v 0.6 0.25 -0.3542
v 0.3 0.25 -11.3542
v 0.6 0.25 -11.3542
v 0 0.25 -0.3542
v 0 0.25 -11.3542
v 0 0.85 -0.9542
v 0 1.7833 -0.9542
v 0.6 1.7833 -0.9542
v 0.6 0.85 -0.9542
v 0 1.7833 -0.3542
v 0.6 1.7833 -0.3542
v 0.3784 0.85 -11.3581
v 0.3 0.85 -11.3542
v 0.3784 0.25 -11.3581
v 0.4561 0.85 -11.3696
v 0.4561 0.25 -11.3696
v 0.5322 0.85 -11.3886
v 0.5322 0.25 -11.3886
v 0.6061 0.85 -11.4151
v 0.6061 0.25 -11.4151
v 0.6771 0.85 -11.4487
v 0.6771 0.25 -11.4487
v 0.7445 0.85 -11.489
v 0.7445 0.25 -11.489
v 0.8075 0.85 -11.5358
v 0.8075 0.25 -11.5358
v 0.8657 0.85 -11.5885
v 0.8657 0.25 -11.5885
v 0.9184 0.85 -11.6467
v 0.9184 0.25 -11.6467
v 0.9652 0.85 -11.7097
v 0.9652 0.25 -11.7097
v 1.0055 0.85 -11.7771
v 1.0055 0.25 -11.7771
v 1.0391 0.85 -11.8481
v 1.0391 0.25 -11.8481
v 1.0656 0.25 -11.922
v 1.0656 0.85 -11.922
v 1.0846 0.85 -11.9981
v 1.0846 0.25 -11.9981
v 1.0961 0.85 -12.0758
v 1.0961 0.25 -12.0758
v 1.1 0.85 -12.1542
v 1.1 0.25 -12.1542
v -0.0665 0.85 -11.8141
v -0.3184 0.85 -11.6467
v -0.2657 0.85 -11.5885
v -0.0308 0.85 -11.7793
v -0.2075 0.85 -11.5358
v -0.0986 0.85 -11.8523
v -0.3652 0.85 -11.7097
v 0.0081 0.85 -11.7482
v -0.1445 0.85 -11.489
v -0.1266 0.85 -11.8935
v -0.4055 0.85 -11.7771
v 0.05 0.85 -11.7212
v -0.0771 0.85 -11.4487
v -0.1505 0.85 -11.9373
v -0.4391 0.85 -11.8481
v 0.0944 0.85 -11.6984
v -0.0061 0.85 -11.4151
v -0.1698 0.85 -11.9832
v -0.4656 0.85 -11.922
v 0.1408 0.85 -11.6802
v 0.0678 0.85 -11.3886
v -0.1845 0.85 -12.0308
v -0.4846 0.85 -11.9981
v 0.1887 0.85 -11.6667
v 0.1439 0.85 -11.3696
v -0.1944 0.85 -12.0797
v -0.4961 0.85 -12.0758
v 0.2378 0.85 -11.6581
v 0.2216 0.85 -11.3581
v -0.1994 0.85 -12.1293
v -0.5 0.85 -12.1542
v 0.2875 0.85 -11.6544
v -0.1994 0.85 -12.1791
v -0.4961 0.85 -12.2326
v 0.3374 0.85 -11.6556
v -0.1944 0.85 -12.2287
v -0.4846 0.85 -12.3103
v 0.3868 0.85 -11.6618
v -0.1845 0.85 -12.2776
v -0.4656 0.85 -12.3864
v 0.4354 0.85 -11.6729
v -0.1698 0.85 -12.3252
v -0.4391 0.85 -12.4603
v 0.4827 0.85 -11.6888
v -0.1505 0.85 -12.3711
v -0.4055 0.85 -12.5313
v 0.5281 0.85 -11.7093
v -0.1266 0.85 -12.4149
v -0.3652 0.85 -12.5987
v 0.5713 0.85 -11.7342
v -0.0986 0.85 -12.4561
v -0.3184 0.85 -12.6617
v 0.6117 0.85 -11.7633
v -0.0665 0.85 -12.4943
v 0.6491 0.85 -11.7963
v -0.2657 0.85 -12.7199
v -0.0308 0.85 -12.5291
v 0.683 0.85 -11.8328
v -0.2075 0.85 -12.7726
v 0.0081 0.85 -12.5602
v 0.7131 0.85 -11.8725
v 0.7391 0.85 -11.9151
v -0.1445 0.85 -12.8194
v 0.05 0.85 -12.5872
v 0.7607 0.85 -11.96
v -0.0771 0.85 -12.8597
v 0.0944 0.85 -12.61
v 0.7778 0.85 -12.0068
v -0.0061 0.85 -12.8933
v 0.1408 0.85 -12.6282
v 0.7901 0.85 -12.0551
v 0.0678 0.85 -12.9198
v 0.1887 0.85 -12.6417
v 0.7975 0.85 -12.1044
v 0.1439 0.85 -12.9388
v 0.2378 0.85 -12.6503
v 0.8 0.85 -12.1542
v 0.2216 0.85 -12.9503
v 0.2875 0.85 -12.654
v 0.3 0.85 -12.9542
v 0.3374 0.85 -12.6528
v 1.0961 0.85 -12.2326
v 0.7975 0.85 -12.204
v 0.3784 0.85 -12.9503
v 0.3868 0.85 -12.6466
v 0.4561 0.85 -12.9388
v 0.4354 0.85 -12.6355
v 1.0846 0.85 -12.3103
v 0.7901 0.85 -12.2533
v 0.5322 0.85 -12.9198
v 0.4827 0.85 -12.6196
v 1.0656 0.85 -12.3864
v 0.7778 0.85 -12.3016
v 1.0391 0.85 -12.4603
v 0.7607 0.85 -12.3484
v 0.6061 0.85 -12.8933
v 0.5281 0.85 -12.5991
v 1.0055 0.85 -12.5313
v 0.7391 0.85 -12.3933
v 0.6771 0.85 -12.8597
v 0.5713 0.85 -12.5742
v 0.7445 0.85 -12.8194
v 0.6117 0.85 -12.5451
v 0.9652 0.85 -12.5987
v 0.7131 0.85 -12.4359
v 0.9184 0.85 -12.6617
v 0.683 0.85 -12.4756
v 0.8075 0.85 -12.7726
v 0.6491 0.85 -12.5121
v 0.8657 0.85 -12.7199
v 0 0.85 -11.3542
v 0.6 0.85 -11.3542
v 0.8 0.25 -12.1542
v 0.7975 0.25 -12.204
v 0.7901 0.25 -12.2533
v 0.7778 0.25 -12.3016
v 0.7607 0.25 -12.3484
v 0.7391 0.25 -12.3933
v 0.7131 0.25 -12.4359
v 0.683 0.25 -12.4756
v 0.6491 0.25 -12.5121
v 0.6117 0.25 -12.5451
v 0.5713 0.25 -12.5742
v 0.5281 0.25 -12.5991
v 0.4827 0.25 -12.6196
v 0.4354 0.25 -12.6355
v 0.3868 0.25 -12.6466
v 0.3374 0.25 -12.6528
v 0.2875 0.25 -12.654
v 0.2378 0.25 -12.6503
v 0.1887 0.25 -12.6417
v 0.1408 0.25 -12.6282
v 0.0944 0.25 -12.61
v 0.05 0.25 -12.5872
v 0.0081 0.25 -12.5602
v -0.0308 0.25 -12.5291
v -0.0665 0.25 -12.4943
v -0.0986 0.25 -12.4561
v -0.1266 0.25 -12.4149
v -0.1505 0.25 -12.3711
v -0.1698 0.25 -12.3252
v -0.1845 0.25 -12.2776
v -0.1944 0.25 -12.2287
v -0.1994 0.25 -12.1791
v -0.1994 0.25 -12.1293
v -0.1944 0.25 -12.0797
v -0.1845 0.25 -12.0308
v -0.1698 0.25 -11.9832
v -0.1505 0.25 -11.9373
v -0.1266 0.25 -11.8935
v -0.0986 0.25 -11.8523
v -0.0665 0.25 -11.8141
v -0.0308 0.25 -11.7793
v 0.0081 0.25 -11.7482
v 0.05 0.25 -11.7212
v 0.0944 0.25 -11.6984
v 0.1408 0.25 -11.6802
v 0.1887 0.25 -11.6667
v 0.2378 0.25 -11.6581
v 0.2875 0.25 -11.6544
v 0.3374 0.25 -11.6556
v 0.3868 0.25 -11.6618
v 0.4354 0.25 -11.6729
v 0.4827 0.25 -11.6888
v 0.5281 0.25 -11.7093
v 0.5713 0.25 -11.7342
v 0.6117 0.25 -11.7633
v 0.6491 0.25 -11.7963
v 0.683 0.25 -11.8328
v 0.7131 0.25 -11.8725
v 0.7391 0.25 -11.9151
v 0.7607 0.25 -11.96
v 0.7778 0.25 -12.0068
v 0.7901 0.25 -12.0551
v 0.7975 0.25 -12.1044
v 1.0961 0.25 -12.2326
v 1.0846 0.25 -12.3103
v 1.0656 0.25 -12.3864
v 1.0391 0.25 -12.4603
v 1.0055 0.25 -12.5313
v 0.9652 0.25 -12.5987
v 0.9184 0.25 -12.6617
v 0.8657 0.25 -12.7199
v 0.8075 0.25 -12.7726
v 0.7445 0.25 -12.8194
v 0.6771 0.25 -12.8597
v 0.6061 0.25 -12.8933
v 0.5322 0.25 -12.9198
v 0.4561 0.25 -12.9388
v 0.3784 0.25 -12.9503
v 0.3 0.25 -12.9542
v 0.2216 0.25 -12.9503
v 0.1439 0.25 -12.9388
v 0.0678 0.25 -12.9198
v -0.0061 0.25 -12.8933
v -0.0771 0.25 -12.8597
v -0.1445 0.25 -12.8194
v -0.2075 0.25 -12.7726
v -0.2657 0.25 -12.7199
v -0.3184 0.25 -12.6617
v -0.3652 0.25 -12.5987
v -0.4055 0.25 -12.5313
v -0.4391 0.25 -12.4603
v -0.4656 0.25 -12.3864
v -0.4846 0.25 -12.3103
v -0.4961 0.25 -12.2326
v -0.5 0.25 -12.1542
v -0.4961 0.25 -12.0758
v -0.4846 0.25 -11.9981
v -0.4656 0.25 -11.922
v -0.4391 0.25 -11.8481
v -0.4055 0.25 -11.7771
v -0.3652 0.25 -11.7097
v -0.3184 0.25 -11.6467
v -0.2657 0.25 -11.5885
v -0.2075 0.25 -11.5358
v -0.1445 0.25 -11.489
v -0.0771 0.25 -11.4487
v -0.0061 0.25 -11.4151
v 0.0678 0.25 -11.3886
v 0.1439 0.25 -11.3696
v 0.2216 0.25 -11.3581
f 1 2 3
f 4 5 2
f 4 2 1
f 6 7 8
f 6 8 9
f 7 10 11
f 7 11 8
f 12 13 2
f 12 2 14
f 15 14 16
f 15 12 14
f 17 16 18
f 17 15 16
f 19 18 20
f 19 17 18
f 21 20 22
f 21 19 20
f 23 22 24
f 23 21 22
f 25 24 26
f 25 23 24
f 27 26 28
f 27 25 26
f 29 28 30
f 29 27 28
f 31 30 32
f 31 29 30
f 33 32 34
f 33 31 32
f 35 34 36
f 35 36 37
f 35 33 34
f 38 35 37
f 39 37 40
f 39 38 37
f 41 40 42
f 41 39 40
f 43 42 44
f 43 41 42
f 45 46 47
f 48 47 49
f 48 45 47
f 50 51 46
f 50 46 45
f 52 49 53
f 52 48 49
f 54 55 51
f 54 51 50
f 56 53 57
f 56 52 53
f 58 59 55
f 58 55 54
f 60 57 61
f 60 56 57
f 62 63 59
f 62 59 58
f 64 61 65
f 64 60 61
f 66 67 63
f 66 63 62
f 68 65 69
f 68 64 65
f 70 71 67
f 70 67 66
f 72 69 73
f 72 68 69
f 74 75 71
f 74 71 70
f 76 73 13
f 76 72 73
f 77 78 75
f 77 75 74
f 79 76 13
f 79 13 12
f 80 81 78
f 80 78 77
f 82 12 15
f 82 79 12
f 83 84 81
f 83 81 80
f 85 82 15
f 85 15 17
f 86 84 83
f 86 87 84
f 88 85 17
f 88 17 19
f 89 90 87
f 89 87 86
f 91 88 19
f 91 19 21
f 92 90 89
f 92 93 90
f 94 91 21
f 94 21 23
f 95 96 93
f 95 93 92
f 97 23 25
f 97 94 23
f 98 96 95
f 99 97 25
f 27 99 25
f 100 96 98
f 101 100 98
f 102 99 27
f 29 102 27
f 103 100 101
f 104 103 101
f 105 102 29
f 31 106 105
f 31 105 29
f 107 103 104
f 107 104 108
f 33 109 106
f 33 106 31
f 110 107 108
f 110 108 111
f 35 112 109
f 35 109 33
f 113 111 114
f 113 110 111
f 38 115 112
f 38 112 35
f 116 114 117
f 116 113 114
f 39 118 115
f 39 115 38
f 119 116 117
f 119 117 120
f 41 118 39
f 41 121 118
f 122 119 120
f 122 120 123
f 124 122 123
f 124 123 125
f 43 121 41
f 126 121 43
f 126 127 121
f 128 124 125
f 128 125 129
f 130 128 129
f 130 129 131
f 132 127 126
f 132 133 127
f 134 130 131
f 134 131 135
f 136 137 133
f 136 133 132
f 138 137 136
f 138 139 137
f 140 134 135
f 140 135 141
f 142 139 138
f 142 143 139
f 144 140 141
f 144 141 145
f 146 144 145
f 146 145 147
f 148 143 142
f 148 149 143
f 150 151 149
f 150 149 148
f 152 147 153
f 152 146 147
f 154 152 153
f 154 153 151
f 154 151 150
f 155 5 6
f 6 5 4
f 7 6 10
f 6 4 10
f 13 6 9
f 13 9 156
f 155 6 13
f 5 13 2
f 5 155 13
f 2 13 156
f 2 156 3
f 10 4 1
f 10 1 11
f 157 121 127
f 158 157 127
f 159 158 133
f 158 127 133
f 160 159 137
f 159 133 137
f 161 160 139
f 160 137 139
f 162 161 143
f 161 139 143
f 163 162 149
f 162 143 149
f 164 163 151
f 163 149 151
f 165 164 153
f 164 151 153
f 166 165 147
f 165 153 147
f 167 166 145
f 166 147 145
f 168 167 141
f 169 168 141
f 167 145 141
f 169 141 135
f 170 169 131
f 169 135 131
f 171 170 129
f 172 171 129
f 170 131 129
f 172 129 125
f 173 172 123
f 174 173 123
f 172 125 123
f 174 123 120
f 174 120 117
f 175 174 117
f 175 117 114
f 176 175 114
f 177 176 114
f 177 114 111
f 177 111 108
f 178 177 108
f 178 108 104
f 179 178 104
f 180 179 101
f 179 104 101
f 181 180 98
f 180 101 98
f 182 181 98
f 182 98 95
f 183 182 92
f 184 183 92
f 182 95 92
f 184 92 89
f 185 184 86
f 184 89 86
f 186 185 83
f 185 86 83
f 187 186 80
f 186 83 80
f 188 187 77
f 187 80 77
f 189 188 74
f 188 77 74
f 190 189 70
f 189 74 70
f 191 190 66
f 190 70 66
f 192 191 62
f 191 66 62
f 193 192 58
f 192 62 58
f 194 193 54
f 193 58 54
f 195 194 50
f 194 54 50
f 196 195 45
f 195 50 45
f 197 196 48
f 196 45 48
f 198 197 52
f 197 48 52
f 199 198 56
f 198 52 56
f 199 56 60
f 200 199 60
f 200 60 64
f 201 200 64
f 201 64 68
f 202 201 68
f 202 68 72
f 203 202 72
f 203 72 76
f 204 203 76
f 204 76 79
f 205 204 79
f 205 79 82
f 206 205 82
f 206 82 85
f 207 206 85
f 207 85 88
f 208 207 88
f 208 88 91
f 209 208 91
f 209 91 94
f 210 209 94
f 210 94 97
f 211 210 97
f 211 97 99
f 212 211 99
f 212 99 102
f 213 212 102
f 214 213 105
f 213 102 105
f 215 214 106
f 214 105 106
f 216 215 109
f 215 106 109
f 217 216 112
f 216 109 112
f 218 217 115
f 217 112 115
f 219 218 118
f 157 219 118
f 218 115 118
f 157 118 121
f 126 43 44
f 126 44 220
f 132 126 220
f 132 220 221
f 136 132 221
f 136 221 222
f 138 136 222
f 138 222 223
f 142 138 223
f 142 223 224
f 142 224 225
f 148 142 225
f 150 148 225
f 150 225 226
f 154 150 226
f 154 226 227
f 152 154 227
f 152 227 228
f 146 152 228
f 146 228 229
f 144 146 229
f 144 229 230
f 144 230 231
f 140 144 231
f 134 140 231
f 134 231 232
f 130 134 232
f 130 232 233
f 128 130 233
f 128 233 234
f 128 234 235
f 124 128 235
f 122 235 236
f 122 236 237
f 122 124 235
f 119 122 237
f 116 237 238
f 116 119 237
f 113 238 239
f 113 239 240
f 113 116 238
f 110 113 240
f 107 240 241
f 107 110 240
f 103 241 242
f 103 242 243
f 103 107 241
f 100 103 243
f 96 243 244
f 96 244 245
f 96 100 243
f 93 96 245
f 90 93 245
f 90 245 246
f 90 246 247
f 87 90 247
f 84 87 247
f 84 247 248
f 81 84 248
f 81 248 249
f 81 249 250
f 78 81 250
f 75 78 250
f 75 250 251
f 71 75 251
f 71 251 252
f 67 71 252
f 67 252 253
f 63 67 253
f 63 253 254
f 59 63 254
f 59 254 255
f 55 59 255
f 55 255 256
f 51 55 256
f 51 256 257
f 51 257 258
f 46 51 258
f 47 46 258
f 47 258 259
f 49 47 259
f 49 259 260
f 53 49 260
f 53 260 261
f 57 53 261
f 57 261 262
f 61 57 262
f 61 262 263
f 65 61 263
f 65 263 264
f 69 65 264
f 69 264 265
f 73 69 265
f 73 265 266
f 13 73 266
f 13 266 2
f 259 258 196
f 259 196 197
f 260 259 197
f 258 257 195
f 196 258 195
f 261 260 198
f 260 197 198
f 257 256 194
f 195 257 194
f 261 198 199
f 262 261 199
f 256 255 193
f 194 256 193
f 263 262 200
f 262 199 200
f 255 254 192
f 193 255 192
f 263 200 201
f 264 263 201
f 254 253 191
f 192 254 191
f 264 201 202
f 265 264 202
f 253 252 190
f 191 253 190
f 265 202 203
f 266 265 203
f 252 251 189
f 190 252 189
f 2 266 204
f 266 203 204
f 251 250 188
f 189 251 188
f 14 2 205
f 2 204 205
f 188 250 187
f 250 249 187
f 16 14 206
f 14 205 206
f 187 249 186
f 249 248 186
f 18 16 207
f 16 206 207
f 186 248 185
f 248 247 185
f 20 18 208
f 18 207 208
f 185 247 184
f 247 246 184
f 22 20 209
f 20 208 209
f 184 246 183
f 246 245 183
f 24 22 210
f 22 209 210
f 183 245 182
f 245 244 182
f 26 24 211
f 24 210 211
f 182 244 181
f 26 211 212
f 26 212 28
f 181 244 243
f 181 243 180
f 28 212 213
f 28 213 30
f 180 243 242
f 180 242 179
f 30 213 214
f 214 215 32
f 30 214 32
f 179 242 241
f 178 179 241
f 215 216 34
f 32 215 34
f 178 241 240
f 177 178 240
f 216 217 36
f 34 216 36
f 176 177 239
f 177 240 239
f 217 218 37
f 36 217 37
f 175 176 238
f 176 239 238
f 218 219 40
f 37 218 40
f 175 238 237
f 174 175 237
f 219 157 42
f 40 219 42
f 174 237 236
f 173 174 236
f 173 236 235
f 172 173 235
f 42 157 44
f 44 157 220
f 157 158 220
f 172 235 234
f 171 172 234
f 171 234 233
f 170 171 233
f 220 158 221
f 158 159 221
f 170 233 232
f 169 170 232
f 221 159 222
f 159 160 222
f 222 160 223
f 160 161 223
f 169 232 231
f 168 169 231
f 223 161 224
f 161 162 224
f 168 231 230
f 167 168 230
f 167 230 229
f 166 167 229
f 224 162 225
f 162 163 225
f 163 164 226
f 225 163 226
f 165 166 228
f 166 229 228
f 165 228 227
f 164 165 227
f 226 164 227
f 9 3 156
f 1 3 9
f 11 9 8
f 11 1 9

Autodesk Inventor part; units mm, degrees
ref_plane "YZ Plane" through (0, 0, 0) normal (1, 0, 0) x (0, 1, 0)
ref_plane "XZ Plane" through (0, 0, 0) normal (0, 1, 0) x (-1, 0, 0)
ref_plane "XY Plane" through (0, 0, 0) normal (0, 0, 1) x (1, 0, 0)
sketch "Skizze1" plane through (0, 0, 0) normal (1, 0, 0) x (0, 1, 0)
  line L0 (1.7833, -0.9542) -> (0.85, -0.9542)
  line L1 (0.85, -0.9542) -> (0.85, -11.3542)
  line L2 (0.85, -11.3542) -> (0.25, -11.3542)
  line L3 (0.25, -11.3542) -> (0.25, -0.3542)
  line L4 (0.25, -0.3542) -> (1.7833, -0.3542)
  line L5 (1.7833, -0.3542) -> (1.7833, -0.9542)
  point P0 (0, 0)
  dimension "d0" = 0.6
  dimension "d1" = 0.6
  dimension "d2" = 11
extrude "Extrusion1" add sketch "Skizze1" along normal blind 0.6
sketch "Skizze4" plane through (0, 0.85, -0.9542) normal (0, 1, 0) x (1, 0, 0)
  line L0 (0, 10.4) -> (0.6, 10.4)
  line L1 (0, 10.4) -> (0.6, 10.4) projected
  circle A0 centre (0.3, 11.2) radius 0.8
  line L2 (0, 10.4) -> (0.6, 10.4) projected
  point P0 (0, -0.9542)
  dimension "d14" = 1.6
extrude "Extrusion3" add sketch "Skizze4" against normal blind 0.6
sketch "Skizze6" plane through (0.3, 0.85, -12.1542) normal (0, 1, 0) x (1, 0, 0)
  circle A0 centre (0, 0) radius 0.5
  circle A1 centre (0, 0) radius 0.8 projected
  point P0 (-0.3, -12.1542)
  point P1 (0, -0.8)
  dimension "d15" = 1
extrude "Extrusion5" cut sketch "Skizze6" against normal blind 0.6 contours A0
properties part number "LegAnode" material "Aluminium 6061"
